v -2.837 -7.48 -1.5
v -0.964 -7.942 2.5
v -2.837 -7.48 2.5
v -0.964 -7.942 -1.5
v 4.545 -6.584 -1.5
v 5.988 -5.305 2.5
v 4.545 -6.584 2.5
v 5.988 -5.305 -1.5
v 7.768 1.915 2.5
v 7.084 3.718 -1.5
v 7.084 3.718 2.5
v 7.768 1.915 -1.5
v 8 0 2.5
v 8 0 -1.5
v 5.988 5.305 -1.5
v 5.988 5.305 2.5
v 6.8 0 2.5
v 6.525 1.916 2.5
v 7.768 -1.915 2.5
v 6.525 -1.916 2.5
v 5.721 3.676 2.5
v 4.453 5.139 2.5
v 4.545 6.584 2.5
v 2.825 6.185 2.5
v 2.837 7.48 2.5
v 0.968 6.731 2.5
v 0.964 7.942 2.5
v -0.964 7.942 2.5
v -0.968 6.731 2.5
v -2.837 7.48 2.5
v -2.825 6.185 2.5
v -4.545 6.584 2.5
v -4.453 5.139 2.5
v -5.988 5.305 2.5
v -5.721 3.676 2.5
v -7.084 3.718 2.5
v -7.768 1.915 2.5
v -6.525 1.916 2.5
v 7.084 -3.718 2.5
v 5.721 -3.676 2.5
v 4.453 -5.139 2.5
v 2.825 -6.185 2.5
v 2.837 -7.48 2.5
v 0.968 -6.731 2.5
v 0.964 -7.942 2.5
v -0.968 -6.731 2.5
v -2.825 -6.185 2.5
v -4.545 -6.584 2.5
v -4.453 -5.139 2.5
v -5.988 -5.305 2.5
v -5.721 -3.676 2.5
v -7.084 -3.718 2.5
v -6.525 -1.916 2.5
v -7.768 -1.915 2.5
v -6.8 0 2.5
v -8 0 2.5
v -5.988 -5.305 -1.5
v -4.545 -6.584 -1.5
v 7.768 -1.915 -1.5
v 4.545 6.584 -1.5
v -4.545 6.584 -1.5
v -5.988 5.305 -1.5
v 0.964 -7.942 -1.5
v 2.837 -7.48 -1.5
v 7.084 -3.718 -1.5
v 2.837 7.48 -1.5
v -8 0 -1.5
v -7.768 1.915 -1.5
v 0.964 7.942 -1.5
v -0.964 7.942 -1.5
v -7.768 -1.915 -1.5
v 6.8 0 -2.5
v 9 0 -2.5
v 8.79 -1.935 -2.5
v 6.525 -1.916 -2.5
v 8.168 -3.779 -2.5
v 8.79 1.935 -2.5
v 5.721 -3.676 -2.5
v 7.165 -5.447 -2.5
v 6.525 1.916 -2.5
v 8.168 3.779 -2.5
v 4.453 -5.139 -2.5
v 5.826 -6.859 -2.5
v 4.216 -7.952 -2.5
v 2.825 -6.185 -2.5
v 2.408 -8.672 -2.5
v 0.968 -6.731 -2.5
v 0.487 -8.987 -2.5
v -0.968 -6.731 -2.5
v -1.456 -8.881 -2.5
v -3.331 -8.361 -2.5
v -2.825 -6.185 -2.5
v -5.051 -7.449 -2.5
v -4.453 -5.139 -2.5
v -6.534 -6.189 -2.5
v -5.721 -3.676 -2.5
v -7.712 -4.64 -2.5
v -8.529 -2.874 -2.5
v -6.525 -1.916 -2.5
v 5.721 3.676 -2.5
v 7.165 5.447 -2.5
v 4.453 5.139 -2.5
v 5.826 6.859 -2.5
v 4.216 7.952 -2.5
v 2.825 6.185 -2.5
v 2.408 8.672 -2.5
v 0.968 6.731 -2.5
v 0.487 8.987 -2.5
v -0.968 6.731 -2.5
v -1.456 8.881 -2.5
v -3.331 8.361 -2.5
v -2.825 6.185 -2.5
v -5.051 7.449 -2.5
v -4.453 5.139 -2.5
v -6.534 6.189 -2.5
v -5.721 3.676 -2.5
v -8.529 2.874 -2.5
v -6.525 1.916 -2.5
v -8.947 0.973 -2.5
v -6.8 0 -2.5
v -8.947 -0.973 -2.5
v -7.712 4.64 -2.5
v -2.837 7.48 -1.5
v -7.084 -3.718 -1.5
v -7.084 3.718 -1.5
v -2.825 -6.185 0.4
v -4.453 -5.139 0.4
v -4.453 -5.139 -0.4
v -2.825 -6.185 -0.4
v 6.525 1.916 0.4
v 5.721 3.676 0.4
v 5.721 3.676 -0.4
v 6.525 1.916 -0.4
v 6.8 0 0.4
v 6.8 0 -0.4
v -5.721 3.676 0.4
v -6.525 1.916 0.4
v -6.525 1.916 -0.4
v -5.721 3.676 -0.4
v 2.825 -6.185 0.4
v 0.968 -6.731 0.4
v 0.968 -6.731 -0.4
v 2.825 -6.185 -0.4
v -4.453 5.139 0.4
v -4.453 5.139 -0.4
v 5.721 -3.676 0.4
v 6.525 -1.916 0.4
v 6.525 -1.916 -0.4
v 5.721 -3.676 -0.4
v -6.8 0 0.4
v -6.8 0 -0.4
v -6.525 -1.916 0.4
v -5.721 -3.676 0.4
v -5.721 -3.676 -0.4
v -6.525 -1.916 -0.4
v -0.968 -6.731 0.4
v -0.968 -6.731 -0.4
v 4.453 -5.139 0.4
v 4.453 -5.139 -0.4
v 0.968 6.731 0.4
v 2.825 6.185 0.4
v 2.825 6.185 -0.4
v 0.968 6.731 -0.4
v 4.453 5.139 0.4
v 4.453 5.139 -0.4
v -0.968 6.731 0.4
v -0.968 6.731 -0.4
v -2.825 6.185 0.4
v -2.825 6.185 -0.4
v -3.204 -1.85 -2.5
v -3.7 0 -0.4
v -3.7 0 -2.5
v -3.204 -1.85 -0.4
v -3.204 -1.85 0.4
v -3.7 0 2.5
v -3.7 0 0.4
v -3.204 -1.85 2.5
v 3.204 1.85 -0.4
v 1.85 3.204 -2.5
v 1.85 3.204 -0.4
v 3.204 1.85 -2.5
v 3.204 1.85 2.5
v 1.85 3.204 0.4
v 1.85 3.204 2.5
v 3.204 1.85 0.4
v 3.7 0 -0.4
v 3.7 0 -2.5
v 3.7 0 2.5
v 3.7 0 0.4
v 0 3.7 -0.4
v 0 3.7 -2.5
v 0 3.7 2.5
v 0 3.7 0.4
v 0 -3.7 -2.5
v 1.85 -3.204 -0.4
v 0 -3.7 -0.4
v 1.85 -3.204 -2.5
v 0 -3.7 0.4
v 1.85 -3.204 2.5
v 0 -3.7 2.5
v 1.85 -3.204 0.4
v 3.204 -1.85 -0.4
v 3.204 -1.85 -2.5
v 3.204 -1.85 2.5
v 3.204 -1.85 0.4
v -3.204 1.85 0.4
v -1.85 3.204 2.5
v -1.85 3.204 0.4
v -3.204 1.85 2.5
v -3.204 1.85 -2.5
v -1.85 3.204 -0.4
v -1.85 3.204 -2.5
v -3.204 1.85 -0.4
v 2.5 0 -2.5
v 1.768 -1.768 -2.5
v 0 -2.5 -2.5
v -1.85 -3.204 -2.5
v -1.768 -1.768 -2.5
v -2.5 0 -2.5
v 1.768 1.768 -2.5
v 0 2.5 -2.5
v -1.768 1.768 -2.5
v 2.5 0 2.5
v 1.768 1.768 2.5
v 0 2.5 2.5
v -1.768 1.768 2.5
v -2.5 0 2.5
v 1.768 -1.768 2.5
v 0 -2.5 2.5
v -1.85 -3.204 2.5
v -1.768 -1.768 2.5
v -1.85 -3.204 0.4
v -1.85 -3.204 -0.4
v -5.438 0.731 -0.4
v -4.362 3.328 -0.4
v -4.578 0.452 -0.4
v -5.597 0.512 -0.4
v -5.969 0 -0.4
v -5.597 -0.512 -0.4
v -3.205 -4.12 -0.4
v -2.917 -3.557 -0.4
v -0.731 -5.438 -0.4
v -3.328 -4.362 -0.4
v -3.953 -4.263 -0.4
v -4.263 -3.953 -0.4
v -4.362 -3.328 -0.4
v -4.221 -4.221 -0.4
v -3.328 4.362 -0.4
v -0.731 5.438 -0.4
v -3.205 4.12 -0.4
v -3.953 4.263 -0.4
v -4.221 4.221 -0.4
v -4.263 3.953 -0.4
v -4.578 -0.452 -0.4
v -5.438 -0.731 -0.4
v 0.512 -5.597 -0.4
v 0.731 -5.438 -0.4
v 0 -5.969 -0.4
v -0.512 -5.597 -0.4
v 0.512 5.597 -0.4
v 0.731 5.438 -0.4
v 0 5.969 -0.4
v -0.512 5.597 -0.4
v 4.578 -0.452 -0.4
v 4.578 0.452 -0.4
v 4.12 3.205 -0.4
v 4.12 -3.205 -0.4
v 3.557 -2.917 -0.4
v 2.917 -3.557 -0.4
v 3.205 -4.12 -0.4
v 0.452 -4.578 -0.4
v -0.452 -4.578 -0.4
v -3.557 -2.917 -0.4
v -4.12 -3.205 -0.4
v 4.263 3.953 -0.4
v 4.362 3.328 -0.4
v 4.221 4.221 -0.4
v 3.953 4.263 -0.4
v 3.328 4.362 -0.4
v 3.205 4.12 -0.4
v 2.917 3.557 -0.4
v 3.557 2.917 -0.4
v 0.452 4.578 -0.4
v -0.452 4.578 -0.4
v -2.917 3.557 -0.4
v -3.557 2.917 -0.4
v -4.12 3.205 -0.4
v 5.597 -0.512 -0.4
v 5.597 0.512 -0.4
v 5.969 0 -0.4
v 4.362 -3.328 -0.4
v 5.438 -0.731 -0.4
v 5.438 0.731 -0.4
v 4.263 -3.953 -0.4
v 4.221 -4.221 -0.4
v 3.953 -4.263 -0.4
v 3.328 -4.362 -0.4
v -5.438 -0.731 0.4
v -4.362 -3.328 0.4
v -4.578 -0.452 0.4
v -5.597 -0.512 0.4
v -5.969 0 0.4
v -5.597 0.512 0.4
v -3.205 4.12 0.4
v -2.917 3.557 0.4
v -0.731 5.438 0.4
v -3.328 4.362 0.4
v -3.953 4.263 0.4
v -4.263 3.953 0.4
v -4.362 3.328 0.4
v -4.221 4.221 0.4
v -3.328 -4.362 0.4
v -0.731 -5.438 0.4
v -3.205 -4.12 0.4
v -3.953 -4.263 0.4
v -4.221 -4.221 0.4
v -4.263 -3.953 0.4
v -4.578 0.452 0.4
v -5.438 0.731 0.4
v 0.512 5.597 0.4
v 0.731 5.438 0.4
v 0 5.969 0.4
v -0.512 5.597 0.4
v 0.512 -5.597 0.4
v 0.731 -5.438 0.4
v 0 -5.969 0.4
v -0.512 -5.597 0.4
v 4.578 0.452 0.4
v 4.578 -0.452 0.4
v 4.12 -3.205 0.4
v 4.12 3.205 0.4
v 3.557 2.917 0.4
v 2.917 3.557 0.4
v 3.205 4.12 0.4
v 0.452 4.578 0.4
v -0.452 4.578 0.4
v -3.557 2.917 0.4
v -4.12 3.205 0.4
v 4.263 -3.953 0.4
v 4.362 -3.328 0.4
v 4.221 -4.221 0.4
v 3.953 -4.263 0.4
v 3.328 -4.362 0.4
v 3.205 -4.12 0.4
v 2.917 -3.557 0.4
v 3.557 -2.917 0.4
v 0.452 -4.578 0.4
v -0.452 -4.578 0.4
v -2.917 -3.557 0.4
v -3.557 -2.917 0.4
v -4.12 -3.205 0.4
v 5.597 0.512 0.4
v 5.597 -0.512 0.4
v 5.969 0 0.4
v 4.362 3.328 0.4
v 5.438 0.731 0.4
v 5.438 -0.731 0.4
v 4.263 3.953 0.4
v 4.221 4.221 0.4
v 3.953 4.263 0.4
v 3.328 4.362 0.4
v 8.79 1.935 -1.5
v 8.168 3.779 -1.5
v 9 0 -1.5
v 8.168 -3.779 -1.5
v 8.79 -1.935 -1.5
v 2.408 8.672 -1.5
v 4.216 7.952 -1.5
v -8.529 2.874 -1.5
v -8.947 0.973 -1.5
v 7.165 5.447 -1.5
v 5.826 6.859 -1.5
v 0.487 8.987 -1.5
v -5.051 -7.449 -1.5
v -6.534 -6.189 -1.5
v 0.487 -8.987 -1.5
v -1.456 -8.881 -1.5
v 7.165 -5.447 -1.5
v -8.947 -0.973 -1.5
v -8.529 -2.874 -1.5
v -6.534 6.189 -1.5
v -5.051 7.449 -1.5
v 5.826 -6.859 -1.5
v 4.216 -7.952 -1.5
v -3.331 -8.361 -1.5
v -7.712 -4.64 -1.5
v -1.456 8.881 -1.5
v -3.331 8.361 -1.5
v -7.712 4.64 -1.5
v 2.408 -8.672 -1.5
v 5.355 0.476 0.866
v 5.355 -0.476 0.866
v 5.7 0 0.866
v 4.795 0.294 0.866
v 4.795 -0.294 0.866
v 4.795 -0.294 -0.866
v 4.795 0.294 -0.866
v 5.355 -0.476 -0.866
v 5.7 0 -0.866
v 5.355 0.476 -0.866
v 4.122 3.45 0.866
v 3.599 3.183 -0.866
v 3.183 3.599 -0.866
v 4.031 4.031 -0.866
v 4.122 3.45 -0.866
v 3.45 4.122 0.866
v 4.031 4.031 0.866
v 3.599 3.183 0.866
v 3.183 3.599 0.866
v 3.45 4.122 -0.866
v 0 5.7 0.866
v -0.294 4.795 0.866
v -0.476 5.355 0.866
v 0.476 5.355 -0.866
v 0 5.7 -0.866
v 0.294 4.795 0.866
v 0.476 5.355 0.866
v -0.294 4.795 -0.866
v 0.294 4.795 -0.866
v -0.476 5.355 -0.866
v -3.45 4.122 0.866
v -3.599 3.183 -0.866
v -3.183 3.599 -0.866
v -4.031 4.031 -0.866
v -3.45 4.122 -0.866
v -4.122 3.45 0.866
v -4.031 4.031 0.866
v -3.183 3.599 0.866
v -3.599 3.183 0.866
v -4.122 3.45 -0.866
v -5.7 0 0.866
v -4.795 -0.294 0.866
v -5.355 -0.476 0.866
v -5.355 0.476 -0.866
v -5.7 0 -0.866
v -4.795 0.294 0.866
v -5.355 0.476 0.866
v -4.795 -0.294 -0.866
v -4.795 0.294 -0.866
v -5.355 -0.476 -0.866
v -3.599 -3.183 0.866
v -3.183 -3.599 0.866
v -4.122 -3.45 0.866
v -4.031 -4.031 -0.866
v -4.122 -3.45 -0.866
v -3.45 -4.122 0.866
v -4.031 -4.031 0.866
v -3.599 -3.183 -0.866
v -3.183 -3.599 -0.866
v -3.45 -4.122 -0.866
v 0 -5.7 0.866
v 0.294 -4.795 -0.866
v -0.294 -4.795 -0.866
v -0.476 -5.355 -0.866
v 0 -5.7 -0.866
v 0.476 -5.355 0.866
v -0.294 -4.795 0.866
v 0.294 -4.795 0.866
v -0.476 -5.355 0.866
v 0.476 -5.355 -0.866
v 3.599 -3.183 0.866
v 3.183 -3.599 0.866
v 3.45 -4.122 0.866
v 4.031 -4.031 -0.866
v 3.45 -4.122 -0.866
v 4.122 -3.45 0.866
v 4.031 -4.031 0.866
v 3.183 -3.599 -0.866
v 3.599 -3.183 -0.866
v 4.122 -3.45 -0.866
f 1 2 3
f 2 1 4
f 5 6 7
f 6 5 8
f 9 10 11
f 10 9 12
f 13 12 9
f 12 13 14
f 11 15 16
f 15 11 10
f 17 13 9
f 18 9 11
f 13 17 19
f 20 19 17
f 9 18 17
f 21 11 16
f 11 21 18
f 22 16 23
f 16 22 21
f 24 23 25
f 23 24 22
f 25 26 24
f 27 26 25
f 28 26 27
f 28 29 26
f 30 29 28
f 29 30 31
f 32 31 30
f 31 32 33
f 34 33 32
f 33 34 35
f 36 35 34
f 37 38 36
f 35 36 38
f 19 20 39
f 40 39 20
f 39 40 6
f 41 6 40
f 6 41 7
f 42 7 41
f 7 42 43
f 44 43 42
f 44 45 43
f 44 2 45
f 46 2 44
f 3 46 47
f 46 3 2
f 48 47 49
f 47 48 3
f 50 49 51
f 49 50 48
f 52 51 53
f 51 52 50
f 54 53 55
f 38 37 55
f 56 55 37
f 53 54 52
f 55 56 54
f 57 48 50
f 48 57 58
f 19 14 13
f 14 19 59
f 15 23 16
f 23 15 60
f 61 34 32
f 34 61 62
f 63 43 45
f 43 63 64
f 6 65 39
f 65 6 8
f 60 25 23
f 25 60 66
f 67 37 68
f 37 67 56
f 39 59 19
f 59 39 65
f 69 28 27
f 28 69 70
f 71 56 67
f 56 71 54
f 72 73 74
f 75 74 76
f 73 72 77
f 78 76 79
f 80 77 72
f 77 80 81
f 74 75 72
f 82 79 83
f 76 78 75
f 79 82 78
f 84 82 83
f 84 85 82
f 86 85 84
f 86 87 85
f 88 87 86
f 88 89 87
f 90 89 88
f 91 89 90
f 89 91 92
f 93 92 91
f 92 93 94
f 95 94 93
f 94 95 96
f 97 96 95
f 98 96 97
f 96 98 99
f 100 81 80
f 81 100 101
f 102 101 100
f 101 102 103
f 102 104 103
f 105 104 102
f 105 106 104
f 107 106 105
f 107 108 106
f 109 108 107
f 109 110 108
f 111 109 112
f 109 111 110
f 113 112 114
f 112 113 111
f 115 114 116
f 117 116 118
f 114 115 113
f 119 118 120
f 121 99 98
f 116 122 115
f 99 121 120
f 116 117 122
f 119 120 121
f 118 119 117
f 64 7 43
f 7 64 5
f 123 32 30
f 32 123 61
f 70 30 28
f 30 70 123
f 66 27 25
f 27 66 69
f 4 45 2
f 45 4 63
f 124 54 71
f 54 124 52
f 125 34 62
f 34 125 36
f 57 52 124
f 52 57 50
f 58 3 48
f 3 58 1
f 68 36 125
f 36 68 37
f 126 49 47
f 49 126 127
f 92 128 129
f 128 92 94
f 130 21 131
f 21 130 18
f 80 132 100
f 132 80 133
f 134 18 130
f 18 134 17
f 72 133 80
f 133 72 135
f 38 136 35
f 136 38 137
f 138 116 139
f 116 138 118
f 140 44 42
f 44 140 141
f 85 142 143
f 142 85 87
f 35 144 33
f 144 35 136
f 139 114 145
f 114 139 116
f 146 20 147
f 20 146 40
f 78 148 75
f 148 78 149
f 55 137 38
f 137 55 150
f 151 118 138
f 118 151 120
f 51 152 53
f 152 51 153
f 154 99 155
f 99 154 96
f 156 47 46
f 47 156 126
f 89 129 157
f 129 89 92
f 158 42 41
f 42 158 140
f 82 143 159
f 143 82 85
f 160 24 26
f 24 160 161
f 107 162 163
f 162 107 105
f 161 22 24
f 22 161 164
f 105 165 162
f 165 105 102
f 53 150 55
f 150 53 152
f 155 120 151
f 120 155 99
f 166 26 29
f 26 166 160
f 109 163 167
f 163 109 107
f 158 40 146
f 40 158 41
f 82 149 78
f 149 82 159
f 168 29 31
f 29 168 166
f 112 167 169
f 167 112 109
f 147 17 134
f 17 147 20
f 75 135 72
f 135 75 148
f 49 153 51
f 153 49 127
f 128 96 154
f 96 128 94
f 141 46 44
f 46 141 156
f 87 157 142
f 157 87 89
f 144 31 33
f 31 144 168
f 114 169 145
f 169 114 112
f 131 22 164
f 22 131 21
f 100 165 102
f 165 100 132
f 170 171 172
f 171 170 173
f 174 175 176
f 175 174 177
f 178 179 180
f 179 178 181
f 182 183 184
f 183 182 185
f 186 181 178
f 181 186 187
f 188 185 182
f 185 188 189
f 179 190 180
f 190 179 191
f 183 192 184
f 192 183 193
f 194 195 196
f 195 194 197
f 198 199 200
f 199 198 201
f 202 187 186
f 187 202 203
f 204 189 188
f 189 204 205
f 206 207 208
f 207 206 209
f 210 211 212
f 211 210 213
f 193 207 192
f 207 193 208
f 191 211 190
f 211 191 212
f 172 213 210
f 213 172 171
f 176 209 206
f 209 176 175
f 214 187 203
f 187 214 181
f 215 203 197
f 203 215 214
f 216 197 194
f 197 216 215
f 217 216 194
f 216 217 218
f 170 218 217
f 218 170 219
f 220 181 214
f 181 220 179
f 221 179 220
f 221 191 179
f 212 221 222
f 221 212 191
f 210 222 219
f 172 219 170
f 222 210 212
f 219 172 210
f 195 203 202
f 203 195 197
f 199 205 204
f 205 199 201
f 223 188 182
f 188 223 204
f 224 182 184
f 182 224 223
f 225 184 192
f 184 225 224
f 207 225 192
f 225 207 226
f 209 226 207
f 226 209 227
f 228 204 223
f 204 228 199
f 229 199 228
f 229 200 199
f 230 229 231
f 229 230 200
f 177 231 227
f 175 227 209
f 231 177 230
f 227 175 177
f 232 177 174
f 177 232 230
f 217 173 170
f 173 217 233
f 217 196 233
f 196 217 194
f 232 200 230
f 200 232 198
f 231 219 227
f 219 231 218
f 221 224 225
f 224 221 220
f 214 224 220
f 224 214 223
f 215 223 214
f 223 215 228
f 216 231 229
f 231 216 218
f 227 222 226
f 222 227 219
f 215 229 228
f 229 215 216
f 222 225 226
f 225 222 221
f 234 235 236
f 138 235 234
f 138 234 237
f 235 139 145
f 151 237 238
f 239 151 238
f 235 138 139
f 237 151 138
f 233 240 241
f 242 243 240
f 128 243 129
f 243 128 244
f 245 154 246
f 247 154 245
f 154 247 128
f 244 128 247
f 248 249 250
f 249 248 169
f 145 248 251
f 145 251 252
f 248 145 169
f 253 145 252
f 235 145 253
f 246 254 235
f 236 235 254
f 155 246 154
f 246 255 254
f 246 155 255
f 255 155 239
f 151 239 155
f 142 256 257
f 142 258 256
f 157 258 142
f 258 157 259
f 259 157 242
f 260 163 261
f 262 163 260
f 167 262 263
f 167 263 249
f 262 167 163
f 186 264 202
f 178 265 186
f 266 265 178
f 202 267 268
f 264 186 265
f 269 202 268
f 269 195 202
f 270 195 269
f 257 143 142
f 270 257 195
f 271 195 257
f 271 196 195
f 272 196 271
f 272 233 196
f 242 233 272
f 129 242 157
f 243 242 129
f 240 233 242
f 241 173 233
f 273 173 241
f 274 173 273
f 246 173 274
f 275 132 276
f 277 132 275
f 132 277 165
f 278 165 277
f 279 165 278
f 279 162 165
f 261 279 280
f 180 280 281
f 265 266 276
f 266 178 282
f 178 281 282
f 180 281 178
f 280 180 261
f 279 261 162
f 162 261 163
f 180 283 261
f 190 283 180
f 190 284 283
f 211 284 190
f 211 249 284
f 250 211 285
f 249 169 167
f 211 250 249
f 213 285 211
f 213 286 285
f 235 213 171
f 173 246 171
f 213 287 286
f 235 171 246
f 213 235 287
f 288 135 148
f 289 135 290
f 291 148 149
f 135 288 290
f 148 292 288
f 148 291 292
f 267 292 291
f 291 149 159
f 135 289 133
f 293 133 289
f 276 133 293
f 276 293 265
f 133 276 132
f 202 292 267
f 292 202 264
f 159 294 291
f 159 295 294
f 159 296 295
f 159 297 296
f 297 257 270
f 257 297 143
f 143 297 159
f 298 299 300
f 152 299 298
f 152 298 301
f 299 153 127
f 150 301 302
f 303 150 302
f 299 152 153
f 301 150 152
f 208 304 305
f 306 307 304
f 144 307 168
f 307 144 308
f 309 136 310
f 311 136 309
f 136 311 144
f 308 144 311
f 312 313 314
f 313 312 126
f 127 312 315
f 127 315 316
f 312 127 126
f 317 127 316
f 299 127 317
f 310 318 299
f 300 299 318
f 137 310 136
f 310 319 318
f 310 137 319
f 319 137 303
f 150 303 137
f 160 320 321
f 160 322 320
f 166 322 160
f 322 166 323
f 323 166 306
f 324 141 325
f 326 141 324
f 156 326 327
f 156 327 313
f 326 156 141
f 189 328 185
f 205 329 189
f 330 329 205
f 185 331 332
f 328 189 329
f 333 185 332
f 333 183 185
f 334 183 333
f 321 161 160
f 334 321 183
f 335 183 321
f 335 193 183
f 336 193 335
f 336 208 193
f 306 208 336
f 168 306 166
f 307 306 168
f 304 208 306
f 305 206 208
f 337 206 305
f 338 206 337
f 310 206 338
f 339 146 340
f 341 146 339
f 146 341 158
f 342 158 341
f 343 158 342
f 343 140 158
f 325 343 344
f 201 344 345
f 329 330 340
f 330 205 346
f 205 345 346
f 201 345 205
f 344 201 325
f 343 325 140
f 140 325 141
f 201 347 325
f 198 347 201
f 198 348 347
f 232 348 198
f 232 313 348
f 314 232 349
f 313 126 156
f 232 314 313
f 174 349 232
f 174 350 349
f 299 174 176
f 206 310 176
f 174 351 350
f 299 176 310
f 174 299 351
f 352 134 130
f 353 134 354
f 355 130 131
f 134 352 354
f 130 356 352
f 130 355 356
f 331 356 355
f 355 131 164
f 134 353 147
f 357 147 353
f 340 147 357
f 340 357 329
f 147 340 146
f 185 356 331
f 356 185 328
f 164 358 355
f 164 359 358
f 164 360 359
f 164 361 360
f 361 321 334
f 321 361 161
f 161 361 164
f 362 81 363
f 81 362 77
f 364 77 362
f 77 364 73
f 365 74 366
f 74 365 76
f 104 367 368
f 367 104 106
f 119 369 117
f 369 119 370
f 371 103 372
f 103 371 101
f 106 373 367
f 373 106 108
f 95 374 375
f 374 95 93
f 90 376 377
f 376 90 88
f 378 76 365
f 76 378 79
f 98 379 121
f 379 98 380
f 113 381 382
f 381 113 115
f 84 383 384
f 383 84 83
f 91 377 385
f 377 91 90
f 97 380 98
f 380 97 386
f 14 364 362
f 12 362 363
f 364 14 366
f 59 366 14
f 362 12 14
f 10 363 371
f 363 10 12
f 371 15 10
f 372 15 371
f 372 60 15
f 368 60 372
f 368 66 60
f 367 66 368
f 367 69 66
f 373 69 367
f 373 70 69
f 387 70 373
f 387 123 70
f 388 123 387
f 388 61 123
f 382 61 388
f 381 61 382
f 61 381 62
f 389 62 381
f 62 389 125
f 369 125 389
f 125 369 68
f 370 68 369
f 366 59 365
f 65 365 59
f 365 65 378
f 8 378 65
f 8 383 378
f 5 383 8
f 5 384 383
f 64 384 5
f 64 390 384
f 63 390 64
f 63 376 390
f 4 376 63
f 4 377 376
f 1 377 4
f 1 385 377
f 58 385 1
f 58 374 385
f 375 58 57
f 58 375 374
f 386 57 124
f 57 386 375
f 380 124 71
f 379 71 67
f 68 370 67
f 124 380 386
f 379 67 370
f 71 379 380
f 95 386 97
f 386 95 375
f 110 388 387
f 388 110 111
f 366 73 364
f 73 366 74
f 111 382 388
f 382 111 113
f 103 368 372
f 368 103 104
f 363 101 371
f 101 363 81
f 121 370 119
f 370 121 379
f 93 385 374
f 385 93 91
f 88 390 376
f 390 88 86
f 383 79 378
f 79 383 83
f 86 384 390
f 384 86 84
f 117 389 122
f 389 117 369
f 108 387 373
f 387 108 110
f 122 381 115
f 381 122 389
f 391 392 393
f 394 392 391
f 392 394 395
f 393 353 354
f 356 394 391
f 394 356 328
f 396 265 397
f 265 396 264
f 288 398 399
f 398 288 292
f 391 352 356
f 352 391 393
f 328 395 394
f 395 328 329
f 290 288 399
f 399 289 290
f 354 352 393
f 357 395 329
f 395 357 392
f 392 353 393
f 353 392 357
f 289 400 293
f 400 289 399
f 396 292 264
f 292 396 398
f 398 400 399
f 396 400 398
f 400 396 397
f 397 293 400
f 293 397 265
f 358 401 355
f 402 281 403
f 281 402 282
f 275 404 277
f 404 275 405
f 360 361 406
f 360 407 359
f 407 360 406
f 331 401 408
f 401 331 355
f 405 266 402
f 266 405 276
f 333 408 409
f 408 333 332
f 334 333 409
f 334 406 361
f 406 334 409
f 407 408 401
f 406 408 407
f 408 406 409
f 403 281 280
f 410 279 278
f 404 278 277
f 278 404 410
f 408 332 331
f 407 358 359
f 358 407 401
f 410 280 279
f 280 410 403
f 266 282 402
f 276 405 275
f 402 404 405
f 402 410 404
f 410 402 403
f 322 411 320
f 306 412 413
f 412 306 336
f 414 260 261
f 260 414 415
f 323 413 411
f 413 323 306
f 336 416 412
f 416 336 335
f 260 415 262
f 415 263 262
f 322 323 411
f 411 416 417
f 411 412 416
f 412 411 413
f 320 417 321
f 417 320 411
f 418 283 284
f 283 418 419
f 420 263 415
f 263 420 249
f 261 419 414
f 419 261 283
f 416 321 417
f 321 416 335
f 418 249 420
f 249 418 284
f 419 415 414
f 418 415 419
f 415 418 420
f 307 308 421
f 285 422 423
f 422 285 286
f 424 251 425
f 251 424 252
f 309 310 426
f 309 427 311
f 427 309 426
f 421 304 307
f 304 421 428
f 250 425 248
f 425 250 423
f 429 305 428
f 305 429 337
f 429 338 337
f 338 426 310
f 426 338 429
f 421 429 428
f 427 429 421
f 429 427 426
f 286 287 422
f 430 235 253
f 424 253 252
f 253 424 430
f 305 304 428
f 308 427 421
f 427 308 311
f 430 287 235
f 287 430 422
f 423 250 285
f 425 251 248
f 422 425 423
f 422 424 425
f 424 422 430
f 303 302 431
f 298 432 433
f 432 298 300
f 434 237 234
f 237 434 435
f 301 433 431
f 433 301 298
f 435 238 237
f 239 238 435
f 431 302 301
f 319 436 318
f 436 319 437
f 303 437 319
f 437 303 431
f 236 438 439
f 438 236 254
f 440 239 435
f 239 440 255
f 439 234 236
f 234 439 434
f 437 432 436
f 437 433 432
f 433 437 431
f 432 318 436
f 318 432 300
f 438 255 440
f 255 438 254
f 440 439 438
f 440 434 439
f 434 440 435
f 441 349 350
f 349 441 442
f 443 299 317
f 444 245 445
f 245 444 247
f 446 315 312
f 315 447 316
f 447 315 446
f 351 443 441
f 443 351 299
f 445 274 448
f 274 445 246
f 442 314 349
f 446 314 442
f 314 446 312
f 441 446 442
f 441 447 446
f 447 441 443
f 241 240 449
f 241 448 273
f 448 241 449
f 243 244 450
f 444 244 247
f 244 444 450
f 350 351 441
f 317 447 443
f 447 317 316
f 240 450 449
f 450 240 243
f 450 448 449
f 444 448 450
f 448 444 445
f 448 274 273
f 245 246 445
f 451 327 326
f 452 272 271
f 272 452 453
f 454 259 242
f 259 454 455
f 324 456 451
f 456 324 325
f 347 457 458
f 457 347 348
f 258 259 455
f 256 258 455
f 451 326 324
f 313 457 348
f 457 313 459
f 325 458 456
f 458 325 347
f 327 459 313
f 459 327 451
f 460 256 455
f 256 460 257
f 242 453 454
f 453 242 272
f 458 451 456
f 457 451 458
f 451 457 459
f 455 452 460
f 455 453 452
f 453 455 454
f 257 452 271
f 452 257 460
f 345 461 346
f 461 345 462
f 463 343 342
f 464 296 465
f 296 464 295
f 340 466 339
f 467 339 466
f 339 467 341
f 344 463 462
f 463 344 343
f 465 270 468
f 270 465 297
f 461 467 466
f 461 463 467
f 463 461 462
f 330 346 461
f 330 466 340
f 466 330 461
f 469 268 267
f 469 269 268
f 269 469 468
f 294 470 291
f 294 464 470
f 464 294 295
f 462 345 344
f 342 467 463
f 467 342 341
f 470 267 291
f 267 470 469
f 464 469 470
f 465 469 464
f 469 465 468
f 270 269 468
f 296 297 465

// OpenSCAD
// Parameters
bore_diameter_mm = 5; //[2.5:10:0.1]
outer_diameter_mm = 16; //[8:32:0.1]
width_mm = 5; //[2.5:10:0.1]
flange_diameter_mm = 18; //[9:36:0.1]
flange_width_mm = 1; //[0.5:2:0.1]
eps_mm = 0.6; //[0.2:1.5:0.1]
outer_rim_radial_mm = 1.2; //[0.6:2.4:0.1]
inner_hub_radial_mm = 1.2; //[0.6:2.4:0.1]
shield_radial_thickness_mm = 0.6; //[0.3:1.2:0.1]
shield_axial_thickness_mm = 0.8; //[0.4:1.6:0.1]
ball_diameter_mm = 2.0; //[1.0:4.0:0.1]
ball_count = 8; //[6:14:1]
ball_pitch_radius_mm = 5.2; //[3.5:7.0:0.1]

// Outer race
module outer_race() {
  color("DimGray") difference() {
    cylinder(r=outer_diameter_mm/2, h=width_mm, center=true);
    cylinder(r=outer_diameter_mm/2 - outer_rim_radial_mm, h=width_mm + 2*eps_mm, center=true);
  }
}

// Inner race
module inner_race() {
  color("DimGray") difference() {
    cylinder(r=bore_diameter_mm/2 + inner_hub_radial_mm, h=width_mm, center=true);
    cylinder(r=bore_diameter_mm/2, h=width_mm + 2*eps_mm, center=true);
  }
}

// Flange
module flange_feature() {
  color("Silver") difference() {
    translate([0, 0, -width_mm/2 + flange_width_mm/2])
      cylinder(r=flange_diameter_mm/2, h=flange_width_mm, center=true);
    translate([0, 0, -width_mm/2 + flange_width_mm/2])
      cylinder(r=outer_diameter_mm/2 - outer_rim_radial_mm + eps_mm, h=flange_width_mm + 2*eps_mm, center=true);
  }
}

// Shield region
module shield_region() {
  color("Black") difference() {
    cylinder(r=outer_diameter_mm/2 - outer_rim_radial_mm + eps_mm, h=shield_axial_thickness_mm, center=true);
    cylinder(r=bore_diameter_mm/2 + inner_hub_radial_mm - eps_mm, h=shield_axial_thickness_mm + 2*eps_mm, center=true);
  }
}

// Bearing ball
module bearing_ball() {
  color("Silver") sphere(r=ball_diameter_mm/2, center=true);
}

// Bearing balls
module bearing_balls() {
  for (i = [0:ball_count-1]) {
    rotate([0, 0, i*360/ball_count])
      translate([ball_pitch_radius_mm, 0, 0])
      bearing_ball();
  }
}

// Ball bearing assembly
module ball_bearing() {
  union() {
    outer_race();
    inner_race();
    shield_region();
    flange_feature();
    bearing_balls();
  }
}

// Final assembly
module assembly() {
  ball_bearing();
}

assembly();
